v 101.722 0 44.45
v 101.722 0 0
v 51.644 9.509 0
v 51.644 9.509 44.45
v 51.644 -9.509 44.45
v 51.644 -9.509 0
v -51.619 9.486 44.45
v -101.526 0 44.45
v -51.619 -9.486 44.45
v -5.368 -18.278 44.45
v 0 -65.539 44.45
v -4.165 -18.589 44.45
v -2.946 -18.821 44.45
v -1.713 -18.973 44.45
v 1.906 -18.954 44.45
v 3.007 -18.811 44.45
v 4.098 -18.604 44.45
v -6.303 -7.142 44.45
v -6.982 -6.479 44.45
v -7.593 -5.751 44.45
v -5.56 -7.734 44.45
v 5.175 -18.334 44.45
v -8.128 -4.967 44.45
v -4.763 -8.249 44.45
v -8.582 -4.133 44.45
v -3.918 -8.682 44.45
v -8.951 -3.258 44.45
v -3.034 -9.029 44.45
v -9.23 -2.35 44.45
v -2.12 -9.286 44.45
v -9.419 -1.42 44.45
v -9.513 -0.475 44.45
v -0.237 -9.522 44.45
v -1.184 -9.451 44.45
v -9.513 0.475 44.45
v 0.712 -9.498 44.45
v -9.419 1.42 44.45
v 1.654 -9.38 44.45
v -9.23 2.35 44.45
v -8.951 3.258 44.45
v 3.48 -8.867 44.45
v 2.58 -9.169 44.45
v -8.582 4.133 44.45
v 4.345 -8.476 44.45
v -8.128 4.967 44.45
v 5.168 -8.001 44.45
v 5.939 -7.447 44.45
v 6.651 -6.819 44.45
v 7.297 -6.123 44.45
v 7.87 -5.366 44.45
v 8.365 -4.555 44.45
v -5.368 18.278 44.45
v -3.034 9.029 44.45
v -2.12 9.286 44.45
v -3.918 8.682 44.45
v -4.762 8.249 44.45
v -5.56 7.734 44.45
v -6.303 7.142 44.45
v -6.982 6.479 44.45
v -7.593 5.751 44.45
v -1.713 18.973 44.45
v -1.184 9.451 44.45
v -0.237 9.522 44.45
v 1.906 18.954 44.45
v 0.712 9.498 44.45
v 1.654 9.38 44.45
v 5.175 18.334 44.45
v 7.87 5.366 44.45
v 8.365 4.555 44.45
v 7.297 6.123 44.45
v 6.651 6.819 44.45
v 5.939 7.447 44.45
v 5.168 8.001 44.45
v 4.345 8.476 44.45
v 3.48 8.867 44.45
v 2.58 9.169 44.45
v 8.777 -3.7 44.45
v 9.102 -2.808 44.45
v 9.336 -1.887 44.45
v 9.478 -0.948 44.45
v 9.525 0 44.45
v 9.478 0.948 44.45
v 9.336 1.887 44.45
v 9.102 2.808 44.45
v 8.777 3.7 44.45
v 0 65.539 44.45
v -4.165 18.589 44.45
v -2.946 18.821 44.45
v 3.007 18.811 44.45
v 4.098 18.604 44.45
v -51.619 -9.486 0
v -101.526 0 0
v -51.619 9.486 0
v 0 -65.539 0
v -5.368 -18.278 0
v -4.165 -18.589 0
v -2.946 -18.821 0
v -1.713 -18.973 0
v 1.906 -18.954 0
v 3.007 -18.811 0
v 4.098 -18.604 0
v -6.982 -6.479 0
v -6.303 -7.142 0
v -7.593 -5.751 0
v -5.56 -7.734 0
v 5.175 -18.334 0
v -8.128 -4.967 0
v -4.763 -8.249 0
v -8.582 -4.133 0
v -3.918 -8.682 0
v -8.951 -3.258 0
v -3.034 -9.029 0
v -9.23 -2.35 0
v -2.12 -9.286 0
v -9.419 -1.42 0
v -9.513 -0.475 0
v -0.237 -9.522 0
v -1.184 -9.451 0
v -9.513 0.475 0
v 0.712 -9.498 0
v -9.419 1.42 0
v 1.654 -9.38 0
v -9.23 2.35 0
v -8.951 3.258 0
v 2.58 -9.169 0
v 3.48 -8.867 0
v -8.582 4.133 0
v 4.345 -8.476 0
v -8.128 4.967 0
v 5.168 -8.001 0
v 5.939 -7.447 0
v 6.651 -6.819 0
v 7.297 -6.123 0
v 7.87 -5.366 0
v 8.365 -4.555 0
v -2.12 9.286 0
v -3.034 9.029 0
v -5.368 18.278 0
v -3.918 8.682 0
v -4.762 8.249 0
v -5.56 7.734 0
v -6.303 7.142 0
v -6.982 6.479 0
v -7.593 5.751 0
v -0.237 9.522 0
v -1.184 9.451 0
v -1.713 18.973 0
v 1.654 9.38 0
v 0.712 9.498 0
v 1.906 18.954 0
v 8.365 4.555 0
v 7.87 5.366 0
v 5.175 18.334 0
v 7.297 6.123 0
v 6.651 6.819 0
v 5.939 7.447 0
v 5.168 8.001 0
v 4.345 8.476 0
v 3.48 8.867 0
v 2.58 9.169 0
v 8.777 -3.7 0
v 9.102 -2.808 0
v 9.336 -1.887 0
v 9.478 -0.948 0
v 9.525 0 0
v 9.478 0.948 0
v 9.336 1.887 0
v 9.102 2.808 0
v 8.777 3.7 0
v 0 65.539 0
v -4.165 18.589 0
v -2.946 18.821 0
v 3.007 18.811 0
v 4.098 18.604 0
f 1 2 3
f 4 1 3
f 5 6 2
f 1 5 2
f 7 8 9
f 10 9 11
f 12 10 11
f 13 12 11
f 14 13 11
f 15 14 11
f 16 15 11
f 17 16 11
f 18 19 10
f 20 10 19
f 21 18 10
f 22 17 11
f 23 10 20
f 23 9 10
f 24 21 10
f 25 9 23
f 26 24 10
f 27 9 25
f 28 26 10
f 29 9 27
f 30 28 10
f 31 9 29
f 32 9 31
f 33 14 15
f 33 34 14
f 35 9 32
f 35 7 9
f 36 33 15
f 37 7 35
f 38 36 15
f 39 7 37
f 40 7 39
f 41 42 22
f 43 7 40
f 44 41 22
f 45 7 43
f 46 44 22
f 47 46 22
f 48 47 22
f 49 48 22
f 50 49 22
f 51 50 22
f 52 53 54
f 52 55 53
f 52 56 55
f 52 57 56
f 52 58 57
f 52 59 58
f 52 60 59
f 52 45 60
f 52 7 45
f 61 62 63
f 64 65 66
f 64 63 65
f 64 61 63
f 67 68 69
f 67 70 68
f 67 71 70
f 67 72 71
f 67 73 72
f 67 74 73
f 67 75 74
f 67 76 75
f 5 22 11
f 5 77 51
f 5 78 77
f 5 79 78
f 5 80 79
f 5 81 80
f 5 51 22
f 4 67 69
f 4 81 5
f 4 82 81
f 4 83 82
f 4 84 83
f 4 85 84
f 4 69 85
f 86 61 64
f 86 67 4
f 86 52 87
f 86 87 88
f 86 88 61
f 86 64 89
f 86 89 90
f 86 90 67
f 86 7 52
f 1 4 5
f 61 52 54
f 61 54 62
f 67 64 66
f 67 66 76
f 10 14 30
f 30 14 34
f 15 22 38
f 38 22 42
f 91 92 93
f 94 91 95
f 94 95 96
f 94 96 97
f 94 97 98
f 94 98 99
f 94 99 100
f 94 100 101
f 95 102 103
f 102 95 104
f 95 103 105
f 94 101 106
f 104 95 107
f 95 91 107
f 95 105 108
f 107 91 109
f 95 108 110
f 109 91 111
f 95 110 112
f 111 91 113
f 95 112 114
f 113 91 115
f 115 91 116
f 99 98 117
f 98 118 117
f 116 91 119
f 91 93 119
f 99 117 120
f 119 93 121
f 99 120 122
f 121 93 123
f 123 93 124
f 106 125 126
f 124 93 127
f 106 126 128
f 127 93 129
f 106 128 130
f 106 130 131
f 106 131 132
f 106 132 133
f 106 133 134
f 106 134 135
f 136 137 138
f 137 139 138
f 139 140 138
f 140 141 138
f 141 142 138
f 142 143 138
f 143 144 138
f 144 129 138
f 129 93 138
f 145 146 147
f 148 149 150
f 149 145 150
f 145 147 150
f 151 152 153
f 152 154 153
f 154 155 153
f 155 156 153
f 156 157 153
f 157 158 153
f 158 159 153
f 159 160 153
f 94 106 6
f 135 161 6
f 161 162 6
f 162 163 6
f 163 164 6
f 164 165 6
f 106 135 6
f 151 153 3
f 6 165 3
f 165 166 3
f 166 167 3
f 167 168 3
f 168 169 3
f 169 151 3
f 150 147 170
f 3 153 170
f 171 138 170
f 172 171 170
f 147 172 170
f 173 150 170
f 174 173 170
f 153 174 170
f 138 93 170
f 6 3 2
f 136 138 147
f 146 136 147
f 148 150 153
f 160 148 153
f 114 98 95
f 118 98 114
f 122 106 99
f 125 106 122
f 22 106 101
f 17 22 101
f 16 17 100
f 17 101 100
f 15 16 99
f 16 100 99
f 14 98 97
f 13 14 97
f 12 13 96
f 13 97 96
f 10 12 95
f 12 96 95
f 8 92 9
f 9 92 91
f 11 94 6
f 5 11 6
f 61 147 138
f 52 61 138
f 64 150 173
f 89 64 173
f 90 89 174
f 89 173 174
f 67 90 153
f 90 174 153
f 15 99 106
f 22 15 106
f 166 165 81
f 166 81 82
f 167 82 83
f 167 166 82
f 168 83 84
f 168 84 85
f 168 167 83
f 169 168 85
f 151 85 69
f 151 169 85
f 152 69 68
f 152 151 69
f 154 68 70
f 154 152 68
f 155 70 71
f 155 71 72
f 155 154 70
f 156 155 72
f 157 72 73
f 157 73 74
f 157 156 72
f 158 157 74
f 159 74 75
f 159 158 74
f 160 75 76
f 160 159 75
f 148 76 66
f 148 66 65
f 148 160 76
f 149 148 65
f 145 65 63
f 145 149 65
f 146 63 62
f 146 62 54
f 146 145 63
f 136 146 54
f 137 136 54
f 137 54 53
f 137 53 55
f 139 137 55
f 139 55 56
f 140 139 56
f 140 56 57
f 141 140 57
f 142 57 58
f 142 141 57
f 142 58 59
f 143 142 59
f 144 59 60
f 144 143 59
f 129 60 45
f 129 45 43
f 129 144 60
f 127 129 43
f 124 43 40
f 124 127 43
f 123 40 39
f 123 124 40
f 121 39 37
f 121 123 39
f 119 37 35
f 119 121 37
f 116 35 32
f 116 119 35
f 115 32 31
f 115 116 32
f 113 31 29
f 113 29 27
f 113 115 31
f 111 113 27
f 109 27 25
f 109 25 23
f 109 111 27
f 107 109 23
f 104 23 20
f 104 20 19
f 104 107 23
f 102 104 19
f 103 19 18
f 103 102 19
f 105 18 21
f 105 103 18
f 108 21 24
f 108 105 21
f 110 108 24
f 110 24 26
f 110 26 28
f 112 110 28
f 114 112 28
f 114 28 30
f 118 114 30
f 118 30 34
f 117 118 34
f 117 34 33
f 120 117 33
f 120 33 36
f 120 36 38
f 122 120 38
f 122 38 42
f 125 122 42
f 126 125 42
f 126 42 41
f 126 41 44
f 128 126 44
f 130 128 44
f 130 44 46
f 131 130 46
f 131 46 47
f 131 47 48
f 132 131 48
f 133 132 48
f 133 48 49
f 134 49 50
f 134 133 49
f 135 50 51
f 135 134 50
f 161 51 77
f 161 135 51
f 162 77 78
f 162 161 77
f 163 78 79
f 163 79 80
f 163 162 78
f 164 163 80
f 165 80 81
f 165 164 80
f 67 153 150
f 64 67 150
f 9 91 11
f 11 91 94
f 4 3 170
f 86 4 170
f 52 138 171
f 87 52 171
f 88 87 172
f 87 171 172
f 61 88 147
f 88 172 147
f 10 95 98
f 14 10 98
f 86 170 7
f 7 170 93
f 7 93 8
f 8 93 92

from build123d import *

# Parameters (mm, degrees)
F0_R     = 9.525
F1_DEPTH = 44.45
F2_DEPTH = 44.45
F3_DEPTH = 44.45
F4_DEPTH = 44.45
F5_DEPTH = 44.45
F6_DEPTH = 44.45
F7_DEPTH = 44.45
F8_DEPTH = 25.4
F9_DEPTH = 19.05


with BuildPart() as f1:
    # F0 (on Top) → F1 (new body)
    with BuildSketch(Plane.XY):
        with BuildLine():
            Line((5.1747410867, 18.3336999726), (1.9060083062, 18.9544093112))
            ThreePointArc((1.9060083062, 18.9544093112), (0.0969078237, 19.0497535122), (-1.7130690518, 18.9728198859))
            Line((-1.7130690518, 18.9728198859), (-5.3677419125, 18.2781248152))
            ThreePointArc((-5.3677419125, 18.2781248152), (-19.05, 0), (-5.3677419125, -18.2781248152))
            Line((-5.3677419125, -18.2781248152), (-1.7130690518, -18.9728198859))
            ThreePointArc((-1.7130690518, -18.9728198859), (0.0969078237, -19.0497535122), (1.9060083062, -18.9544093112))
            Line((1.9060083062, -18.9544093112), (5.1747410867, -18.3336999726))
            ThreePointArc((5.1747410867, -18.3336999726), (15.1901500602, -11.4961663675), (19.05, 0))
            ThreePointArc((19.05, 0), (15.1901500602, 11.4961663675), (5.1747410867, 18.3336999726))
        make_face()
        Circle(F0_R, mode=Mode.SUBTRACT)
        with BuildLine():
            Line((51.6444474156, 9.5094299521), (5.1747410867, 18.3336999726))
            ThreePointArc((5.1747410867, 18.3336999726), (15.1901500602, 11.4961663675), (19.05, 0))
            ThreePointArc((19.05, 0), (15.1901500602, -11.4961663675), (5.1747410867, -18.3336999726))
            Line((5.1747410867, -18.3336999726), (51.6444474156, -9.5094299521))
            Line((51.6444474156, -9.5094299521), (101.722291385, 0))
            Line((101.722291385, 0), (51.6444474156, 9.5094299521))
        make_face()
    extrude(amount=F1_DEPTH)

    # F0 (on Top) → F2 (join)
    with BuildSketch(Plane.XY):
        with BuildLine():
            Line((0, 65.538806632), (1.9060083062, 18.9544093112))
            ThreePointArc((1.9060083062, 18.9544093112), (3.5539517459, 18.7155530773), (5.1747410867, 18.3336999726))
            Line((5.1747410867, 18.3336999726), (51.6444474156, 9.5094299521))
            Line((51.6444474156, 9.5094299521), (0, 65.538806632))
        make_face()
    extrude(amount=F2_DEPTH)

    # F0 (on Top) → F3 (join)
    with BuildSketch(Plane.XY):
        with BuildLine():
            ThreePointArc((-5.3677419125, -18.2781248152), (-19.05, 0), (-5.3677419125, 18.2781248152))
            Line((-5.3677419125, 18.2781248152), (-51.6194616924, 9.486409943))
            Line((-51.6194616924, 9.486409943), (-101.5258543329, 0))
            Line((-101.5258543329, 0), (-51.6194616924, -9.486409943))
            Line((-51.6194616924, -9.486409943), (-5.3677419125, -18.2781248152))
        make_face()
    extrude(amount=F3_DEPTH)

    # F0 (on Top) → F4 (join)
    with BuildSketch(Plane.XY):
        with BuildLine():
            ThreePointArc((1.9060083062, -18.9544093112), (0.0969078237, -19.0497535122), (-1.7130690518, -18.9728198859))
            Line((-1.7130690518, -18.9728198859), (0, -65.538806632))
            Line((0, -65.538806632), (1.9060083062, -18.9544093112))
        make_face()
    extrude(amount=F4_DEPTH)

    # F0 (on Top) → F5 (join)
    with BuildSketch(Plane.XY):
        with BuildLine():
            ThreePointArc((-1.7130690518, 18.9728198859), (0.0969078237, 19.0497535122), (1.9060083062, 18.9544093112))
            Line((1.9060083062, 18.9544093112), (0, 65.538806632))
            Line((0, 65.538806632), (-1.7130690518, 18.9728198859))
        make_face()
    extrude(amount=F5_DEPTH)

    # F0 (on Top) → F6 (join)
    with BuildSketch(Plane.XY):
        with BuildLine():
            ThreePointArc((-1.7130690518, -18.9728198859), (-3.5574037286, -18.7148972402), (-5.3677419125, -18.2781248152))
            Line((-5.3677419125, -18.2781248152), (-51.6194616924, -9.486409943))
            Line((-51.6194616924, -9.486409943), (0, -65.538806632))
            Line((0, -65.538806632), (-1.7130690518, -18.9728198859))
        make_face()
        with BuildLine():
            Line((51.6444474156, -9.5094299521), (5.1747410867, -18.3336999726))
            ThreePointArc((5.1747410867, -18.3336999726), (3.5539517459, -18.7155530773), (1.9060083062, -18.9544093112))
            Line((1.9060083062, -18.9544093112), (0, -65.538806632))
            Line((0, -65.538806632), (51.6444474156, -9.5094299521))
        make_face()
    extrude(amount=F6_DEPTH)

    # F0 (on Top) → F7 (join)
    with BuildSketch(Plane.XY):
        with BuildLine():
            Line((0, 65.538806632), (1.9060083062, 18.9544093112))
            ThreePointArc((1.9060083062, 18.9544093112), (3.5539517459, 18.7155530773), (5.1747410867, 18.3336999726))
            Line((5.1747410867, 18.3336999726), (51.6444474156, 9.5094299521))
            Line((51.6444474156, 9.5094299521), (0, 65.538806632))
        make_face()
    extrude(amount=F7_DEPTH)

    # F0 (on Top) → F8 (join)
    with BuildSketch(Plane.XY):
        with BuildLine():
            ThreePointArc((-5.3677419125, 18.2781248152), (-3.5574037286, 18.7148972402), (-1.7130690518, 18.9728198859))
            Line((-1.7130690518, 18.9728198859), (0, 65.538806632))
            Line((0, 65.538806632), (-51.6194616924, 9.486409943))
            Line((-51.6194616924, 9.486409943), (-5.3677419125, 18.2781248152))
        make_face()
    extrude(amount=F8_DEPTH)

    # F9 (add): a face of the model
    f9_faces = [f1.faces().sort_by_distance(p)[0] for p in [
        (-17.7802963079, 31.335159678, 25.4),
    ]]
    extrude(f9_faces, amount=F9_DEPTH)


solid = f1.part
